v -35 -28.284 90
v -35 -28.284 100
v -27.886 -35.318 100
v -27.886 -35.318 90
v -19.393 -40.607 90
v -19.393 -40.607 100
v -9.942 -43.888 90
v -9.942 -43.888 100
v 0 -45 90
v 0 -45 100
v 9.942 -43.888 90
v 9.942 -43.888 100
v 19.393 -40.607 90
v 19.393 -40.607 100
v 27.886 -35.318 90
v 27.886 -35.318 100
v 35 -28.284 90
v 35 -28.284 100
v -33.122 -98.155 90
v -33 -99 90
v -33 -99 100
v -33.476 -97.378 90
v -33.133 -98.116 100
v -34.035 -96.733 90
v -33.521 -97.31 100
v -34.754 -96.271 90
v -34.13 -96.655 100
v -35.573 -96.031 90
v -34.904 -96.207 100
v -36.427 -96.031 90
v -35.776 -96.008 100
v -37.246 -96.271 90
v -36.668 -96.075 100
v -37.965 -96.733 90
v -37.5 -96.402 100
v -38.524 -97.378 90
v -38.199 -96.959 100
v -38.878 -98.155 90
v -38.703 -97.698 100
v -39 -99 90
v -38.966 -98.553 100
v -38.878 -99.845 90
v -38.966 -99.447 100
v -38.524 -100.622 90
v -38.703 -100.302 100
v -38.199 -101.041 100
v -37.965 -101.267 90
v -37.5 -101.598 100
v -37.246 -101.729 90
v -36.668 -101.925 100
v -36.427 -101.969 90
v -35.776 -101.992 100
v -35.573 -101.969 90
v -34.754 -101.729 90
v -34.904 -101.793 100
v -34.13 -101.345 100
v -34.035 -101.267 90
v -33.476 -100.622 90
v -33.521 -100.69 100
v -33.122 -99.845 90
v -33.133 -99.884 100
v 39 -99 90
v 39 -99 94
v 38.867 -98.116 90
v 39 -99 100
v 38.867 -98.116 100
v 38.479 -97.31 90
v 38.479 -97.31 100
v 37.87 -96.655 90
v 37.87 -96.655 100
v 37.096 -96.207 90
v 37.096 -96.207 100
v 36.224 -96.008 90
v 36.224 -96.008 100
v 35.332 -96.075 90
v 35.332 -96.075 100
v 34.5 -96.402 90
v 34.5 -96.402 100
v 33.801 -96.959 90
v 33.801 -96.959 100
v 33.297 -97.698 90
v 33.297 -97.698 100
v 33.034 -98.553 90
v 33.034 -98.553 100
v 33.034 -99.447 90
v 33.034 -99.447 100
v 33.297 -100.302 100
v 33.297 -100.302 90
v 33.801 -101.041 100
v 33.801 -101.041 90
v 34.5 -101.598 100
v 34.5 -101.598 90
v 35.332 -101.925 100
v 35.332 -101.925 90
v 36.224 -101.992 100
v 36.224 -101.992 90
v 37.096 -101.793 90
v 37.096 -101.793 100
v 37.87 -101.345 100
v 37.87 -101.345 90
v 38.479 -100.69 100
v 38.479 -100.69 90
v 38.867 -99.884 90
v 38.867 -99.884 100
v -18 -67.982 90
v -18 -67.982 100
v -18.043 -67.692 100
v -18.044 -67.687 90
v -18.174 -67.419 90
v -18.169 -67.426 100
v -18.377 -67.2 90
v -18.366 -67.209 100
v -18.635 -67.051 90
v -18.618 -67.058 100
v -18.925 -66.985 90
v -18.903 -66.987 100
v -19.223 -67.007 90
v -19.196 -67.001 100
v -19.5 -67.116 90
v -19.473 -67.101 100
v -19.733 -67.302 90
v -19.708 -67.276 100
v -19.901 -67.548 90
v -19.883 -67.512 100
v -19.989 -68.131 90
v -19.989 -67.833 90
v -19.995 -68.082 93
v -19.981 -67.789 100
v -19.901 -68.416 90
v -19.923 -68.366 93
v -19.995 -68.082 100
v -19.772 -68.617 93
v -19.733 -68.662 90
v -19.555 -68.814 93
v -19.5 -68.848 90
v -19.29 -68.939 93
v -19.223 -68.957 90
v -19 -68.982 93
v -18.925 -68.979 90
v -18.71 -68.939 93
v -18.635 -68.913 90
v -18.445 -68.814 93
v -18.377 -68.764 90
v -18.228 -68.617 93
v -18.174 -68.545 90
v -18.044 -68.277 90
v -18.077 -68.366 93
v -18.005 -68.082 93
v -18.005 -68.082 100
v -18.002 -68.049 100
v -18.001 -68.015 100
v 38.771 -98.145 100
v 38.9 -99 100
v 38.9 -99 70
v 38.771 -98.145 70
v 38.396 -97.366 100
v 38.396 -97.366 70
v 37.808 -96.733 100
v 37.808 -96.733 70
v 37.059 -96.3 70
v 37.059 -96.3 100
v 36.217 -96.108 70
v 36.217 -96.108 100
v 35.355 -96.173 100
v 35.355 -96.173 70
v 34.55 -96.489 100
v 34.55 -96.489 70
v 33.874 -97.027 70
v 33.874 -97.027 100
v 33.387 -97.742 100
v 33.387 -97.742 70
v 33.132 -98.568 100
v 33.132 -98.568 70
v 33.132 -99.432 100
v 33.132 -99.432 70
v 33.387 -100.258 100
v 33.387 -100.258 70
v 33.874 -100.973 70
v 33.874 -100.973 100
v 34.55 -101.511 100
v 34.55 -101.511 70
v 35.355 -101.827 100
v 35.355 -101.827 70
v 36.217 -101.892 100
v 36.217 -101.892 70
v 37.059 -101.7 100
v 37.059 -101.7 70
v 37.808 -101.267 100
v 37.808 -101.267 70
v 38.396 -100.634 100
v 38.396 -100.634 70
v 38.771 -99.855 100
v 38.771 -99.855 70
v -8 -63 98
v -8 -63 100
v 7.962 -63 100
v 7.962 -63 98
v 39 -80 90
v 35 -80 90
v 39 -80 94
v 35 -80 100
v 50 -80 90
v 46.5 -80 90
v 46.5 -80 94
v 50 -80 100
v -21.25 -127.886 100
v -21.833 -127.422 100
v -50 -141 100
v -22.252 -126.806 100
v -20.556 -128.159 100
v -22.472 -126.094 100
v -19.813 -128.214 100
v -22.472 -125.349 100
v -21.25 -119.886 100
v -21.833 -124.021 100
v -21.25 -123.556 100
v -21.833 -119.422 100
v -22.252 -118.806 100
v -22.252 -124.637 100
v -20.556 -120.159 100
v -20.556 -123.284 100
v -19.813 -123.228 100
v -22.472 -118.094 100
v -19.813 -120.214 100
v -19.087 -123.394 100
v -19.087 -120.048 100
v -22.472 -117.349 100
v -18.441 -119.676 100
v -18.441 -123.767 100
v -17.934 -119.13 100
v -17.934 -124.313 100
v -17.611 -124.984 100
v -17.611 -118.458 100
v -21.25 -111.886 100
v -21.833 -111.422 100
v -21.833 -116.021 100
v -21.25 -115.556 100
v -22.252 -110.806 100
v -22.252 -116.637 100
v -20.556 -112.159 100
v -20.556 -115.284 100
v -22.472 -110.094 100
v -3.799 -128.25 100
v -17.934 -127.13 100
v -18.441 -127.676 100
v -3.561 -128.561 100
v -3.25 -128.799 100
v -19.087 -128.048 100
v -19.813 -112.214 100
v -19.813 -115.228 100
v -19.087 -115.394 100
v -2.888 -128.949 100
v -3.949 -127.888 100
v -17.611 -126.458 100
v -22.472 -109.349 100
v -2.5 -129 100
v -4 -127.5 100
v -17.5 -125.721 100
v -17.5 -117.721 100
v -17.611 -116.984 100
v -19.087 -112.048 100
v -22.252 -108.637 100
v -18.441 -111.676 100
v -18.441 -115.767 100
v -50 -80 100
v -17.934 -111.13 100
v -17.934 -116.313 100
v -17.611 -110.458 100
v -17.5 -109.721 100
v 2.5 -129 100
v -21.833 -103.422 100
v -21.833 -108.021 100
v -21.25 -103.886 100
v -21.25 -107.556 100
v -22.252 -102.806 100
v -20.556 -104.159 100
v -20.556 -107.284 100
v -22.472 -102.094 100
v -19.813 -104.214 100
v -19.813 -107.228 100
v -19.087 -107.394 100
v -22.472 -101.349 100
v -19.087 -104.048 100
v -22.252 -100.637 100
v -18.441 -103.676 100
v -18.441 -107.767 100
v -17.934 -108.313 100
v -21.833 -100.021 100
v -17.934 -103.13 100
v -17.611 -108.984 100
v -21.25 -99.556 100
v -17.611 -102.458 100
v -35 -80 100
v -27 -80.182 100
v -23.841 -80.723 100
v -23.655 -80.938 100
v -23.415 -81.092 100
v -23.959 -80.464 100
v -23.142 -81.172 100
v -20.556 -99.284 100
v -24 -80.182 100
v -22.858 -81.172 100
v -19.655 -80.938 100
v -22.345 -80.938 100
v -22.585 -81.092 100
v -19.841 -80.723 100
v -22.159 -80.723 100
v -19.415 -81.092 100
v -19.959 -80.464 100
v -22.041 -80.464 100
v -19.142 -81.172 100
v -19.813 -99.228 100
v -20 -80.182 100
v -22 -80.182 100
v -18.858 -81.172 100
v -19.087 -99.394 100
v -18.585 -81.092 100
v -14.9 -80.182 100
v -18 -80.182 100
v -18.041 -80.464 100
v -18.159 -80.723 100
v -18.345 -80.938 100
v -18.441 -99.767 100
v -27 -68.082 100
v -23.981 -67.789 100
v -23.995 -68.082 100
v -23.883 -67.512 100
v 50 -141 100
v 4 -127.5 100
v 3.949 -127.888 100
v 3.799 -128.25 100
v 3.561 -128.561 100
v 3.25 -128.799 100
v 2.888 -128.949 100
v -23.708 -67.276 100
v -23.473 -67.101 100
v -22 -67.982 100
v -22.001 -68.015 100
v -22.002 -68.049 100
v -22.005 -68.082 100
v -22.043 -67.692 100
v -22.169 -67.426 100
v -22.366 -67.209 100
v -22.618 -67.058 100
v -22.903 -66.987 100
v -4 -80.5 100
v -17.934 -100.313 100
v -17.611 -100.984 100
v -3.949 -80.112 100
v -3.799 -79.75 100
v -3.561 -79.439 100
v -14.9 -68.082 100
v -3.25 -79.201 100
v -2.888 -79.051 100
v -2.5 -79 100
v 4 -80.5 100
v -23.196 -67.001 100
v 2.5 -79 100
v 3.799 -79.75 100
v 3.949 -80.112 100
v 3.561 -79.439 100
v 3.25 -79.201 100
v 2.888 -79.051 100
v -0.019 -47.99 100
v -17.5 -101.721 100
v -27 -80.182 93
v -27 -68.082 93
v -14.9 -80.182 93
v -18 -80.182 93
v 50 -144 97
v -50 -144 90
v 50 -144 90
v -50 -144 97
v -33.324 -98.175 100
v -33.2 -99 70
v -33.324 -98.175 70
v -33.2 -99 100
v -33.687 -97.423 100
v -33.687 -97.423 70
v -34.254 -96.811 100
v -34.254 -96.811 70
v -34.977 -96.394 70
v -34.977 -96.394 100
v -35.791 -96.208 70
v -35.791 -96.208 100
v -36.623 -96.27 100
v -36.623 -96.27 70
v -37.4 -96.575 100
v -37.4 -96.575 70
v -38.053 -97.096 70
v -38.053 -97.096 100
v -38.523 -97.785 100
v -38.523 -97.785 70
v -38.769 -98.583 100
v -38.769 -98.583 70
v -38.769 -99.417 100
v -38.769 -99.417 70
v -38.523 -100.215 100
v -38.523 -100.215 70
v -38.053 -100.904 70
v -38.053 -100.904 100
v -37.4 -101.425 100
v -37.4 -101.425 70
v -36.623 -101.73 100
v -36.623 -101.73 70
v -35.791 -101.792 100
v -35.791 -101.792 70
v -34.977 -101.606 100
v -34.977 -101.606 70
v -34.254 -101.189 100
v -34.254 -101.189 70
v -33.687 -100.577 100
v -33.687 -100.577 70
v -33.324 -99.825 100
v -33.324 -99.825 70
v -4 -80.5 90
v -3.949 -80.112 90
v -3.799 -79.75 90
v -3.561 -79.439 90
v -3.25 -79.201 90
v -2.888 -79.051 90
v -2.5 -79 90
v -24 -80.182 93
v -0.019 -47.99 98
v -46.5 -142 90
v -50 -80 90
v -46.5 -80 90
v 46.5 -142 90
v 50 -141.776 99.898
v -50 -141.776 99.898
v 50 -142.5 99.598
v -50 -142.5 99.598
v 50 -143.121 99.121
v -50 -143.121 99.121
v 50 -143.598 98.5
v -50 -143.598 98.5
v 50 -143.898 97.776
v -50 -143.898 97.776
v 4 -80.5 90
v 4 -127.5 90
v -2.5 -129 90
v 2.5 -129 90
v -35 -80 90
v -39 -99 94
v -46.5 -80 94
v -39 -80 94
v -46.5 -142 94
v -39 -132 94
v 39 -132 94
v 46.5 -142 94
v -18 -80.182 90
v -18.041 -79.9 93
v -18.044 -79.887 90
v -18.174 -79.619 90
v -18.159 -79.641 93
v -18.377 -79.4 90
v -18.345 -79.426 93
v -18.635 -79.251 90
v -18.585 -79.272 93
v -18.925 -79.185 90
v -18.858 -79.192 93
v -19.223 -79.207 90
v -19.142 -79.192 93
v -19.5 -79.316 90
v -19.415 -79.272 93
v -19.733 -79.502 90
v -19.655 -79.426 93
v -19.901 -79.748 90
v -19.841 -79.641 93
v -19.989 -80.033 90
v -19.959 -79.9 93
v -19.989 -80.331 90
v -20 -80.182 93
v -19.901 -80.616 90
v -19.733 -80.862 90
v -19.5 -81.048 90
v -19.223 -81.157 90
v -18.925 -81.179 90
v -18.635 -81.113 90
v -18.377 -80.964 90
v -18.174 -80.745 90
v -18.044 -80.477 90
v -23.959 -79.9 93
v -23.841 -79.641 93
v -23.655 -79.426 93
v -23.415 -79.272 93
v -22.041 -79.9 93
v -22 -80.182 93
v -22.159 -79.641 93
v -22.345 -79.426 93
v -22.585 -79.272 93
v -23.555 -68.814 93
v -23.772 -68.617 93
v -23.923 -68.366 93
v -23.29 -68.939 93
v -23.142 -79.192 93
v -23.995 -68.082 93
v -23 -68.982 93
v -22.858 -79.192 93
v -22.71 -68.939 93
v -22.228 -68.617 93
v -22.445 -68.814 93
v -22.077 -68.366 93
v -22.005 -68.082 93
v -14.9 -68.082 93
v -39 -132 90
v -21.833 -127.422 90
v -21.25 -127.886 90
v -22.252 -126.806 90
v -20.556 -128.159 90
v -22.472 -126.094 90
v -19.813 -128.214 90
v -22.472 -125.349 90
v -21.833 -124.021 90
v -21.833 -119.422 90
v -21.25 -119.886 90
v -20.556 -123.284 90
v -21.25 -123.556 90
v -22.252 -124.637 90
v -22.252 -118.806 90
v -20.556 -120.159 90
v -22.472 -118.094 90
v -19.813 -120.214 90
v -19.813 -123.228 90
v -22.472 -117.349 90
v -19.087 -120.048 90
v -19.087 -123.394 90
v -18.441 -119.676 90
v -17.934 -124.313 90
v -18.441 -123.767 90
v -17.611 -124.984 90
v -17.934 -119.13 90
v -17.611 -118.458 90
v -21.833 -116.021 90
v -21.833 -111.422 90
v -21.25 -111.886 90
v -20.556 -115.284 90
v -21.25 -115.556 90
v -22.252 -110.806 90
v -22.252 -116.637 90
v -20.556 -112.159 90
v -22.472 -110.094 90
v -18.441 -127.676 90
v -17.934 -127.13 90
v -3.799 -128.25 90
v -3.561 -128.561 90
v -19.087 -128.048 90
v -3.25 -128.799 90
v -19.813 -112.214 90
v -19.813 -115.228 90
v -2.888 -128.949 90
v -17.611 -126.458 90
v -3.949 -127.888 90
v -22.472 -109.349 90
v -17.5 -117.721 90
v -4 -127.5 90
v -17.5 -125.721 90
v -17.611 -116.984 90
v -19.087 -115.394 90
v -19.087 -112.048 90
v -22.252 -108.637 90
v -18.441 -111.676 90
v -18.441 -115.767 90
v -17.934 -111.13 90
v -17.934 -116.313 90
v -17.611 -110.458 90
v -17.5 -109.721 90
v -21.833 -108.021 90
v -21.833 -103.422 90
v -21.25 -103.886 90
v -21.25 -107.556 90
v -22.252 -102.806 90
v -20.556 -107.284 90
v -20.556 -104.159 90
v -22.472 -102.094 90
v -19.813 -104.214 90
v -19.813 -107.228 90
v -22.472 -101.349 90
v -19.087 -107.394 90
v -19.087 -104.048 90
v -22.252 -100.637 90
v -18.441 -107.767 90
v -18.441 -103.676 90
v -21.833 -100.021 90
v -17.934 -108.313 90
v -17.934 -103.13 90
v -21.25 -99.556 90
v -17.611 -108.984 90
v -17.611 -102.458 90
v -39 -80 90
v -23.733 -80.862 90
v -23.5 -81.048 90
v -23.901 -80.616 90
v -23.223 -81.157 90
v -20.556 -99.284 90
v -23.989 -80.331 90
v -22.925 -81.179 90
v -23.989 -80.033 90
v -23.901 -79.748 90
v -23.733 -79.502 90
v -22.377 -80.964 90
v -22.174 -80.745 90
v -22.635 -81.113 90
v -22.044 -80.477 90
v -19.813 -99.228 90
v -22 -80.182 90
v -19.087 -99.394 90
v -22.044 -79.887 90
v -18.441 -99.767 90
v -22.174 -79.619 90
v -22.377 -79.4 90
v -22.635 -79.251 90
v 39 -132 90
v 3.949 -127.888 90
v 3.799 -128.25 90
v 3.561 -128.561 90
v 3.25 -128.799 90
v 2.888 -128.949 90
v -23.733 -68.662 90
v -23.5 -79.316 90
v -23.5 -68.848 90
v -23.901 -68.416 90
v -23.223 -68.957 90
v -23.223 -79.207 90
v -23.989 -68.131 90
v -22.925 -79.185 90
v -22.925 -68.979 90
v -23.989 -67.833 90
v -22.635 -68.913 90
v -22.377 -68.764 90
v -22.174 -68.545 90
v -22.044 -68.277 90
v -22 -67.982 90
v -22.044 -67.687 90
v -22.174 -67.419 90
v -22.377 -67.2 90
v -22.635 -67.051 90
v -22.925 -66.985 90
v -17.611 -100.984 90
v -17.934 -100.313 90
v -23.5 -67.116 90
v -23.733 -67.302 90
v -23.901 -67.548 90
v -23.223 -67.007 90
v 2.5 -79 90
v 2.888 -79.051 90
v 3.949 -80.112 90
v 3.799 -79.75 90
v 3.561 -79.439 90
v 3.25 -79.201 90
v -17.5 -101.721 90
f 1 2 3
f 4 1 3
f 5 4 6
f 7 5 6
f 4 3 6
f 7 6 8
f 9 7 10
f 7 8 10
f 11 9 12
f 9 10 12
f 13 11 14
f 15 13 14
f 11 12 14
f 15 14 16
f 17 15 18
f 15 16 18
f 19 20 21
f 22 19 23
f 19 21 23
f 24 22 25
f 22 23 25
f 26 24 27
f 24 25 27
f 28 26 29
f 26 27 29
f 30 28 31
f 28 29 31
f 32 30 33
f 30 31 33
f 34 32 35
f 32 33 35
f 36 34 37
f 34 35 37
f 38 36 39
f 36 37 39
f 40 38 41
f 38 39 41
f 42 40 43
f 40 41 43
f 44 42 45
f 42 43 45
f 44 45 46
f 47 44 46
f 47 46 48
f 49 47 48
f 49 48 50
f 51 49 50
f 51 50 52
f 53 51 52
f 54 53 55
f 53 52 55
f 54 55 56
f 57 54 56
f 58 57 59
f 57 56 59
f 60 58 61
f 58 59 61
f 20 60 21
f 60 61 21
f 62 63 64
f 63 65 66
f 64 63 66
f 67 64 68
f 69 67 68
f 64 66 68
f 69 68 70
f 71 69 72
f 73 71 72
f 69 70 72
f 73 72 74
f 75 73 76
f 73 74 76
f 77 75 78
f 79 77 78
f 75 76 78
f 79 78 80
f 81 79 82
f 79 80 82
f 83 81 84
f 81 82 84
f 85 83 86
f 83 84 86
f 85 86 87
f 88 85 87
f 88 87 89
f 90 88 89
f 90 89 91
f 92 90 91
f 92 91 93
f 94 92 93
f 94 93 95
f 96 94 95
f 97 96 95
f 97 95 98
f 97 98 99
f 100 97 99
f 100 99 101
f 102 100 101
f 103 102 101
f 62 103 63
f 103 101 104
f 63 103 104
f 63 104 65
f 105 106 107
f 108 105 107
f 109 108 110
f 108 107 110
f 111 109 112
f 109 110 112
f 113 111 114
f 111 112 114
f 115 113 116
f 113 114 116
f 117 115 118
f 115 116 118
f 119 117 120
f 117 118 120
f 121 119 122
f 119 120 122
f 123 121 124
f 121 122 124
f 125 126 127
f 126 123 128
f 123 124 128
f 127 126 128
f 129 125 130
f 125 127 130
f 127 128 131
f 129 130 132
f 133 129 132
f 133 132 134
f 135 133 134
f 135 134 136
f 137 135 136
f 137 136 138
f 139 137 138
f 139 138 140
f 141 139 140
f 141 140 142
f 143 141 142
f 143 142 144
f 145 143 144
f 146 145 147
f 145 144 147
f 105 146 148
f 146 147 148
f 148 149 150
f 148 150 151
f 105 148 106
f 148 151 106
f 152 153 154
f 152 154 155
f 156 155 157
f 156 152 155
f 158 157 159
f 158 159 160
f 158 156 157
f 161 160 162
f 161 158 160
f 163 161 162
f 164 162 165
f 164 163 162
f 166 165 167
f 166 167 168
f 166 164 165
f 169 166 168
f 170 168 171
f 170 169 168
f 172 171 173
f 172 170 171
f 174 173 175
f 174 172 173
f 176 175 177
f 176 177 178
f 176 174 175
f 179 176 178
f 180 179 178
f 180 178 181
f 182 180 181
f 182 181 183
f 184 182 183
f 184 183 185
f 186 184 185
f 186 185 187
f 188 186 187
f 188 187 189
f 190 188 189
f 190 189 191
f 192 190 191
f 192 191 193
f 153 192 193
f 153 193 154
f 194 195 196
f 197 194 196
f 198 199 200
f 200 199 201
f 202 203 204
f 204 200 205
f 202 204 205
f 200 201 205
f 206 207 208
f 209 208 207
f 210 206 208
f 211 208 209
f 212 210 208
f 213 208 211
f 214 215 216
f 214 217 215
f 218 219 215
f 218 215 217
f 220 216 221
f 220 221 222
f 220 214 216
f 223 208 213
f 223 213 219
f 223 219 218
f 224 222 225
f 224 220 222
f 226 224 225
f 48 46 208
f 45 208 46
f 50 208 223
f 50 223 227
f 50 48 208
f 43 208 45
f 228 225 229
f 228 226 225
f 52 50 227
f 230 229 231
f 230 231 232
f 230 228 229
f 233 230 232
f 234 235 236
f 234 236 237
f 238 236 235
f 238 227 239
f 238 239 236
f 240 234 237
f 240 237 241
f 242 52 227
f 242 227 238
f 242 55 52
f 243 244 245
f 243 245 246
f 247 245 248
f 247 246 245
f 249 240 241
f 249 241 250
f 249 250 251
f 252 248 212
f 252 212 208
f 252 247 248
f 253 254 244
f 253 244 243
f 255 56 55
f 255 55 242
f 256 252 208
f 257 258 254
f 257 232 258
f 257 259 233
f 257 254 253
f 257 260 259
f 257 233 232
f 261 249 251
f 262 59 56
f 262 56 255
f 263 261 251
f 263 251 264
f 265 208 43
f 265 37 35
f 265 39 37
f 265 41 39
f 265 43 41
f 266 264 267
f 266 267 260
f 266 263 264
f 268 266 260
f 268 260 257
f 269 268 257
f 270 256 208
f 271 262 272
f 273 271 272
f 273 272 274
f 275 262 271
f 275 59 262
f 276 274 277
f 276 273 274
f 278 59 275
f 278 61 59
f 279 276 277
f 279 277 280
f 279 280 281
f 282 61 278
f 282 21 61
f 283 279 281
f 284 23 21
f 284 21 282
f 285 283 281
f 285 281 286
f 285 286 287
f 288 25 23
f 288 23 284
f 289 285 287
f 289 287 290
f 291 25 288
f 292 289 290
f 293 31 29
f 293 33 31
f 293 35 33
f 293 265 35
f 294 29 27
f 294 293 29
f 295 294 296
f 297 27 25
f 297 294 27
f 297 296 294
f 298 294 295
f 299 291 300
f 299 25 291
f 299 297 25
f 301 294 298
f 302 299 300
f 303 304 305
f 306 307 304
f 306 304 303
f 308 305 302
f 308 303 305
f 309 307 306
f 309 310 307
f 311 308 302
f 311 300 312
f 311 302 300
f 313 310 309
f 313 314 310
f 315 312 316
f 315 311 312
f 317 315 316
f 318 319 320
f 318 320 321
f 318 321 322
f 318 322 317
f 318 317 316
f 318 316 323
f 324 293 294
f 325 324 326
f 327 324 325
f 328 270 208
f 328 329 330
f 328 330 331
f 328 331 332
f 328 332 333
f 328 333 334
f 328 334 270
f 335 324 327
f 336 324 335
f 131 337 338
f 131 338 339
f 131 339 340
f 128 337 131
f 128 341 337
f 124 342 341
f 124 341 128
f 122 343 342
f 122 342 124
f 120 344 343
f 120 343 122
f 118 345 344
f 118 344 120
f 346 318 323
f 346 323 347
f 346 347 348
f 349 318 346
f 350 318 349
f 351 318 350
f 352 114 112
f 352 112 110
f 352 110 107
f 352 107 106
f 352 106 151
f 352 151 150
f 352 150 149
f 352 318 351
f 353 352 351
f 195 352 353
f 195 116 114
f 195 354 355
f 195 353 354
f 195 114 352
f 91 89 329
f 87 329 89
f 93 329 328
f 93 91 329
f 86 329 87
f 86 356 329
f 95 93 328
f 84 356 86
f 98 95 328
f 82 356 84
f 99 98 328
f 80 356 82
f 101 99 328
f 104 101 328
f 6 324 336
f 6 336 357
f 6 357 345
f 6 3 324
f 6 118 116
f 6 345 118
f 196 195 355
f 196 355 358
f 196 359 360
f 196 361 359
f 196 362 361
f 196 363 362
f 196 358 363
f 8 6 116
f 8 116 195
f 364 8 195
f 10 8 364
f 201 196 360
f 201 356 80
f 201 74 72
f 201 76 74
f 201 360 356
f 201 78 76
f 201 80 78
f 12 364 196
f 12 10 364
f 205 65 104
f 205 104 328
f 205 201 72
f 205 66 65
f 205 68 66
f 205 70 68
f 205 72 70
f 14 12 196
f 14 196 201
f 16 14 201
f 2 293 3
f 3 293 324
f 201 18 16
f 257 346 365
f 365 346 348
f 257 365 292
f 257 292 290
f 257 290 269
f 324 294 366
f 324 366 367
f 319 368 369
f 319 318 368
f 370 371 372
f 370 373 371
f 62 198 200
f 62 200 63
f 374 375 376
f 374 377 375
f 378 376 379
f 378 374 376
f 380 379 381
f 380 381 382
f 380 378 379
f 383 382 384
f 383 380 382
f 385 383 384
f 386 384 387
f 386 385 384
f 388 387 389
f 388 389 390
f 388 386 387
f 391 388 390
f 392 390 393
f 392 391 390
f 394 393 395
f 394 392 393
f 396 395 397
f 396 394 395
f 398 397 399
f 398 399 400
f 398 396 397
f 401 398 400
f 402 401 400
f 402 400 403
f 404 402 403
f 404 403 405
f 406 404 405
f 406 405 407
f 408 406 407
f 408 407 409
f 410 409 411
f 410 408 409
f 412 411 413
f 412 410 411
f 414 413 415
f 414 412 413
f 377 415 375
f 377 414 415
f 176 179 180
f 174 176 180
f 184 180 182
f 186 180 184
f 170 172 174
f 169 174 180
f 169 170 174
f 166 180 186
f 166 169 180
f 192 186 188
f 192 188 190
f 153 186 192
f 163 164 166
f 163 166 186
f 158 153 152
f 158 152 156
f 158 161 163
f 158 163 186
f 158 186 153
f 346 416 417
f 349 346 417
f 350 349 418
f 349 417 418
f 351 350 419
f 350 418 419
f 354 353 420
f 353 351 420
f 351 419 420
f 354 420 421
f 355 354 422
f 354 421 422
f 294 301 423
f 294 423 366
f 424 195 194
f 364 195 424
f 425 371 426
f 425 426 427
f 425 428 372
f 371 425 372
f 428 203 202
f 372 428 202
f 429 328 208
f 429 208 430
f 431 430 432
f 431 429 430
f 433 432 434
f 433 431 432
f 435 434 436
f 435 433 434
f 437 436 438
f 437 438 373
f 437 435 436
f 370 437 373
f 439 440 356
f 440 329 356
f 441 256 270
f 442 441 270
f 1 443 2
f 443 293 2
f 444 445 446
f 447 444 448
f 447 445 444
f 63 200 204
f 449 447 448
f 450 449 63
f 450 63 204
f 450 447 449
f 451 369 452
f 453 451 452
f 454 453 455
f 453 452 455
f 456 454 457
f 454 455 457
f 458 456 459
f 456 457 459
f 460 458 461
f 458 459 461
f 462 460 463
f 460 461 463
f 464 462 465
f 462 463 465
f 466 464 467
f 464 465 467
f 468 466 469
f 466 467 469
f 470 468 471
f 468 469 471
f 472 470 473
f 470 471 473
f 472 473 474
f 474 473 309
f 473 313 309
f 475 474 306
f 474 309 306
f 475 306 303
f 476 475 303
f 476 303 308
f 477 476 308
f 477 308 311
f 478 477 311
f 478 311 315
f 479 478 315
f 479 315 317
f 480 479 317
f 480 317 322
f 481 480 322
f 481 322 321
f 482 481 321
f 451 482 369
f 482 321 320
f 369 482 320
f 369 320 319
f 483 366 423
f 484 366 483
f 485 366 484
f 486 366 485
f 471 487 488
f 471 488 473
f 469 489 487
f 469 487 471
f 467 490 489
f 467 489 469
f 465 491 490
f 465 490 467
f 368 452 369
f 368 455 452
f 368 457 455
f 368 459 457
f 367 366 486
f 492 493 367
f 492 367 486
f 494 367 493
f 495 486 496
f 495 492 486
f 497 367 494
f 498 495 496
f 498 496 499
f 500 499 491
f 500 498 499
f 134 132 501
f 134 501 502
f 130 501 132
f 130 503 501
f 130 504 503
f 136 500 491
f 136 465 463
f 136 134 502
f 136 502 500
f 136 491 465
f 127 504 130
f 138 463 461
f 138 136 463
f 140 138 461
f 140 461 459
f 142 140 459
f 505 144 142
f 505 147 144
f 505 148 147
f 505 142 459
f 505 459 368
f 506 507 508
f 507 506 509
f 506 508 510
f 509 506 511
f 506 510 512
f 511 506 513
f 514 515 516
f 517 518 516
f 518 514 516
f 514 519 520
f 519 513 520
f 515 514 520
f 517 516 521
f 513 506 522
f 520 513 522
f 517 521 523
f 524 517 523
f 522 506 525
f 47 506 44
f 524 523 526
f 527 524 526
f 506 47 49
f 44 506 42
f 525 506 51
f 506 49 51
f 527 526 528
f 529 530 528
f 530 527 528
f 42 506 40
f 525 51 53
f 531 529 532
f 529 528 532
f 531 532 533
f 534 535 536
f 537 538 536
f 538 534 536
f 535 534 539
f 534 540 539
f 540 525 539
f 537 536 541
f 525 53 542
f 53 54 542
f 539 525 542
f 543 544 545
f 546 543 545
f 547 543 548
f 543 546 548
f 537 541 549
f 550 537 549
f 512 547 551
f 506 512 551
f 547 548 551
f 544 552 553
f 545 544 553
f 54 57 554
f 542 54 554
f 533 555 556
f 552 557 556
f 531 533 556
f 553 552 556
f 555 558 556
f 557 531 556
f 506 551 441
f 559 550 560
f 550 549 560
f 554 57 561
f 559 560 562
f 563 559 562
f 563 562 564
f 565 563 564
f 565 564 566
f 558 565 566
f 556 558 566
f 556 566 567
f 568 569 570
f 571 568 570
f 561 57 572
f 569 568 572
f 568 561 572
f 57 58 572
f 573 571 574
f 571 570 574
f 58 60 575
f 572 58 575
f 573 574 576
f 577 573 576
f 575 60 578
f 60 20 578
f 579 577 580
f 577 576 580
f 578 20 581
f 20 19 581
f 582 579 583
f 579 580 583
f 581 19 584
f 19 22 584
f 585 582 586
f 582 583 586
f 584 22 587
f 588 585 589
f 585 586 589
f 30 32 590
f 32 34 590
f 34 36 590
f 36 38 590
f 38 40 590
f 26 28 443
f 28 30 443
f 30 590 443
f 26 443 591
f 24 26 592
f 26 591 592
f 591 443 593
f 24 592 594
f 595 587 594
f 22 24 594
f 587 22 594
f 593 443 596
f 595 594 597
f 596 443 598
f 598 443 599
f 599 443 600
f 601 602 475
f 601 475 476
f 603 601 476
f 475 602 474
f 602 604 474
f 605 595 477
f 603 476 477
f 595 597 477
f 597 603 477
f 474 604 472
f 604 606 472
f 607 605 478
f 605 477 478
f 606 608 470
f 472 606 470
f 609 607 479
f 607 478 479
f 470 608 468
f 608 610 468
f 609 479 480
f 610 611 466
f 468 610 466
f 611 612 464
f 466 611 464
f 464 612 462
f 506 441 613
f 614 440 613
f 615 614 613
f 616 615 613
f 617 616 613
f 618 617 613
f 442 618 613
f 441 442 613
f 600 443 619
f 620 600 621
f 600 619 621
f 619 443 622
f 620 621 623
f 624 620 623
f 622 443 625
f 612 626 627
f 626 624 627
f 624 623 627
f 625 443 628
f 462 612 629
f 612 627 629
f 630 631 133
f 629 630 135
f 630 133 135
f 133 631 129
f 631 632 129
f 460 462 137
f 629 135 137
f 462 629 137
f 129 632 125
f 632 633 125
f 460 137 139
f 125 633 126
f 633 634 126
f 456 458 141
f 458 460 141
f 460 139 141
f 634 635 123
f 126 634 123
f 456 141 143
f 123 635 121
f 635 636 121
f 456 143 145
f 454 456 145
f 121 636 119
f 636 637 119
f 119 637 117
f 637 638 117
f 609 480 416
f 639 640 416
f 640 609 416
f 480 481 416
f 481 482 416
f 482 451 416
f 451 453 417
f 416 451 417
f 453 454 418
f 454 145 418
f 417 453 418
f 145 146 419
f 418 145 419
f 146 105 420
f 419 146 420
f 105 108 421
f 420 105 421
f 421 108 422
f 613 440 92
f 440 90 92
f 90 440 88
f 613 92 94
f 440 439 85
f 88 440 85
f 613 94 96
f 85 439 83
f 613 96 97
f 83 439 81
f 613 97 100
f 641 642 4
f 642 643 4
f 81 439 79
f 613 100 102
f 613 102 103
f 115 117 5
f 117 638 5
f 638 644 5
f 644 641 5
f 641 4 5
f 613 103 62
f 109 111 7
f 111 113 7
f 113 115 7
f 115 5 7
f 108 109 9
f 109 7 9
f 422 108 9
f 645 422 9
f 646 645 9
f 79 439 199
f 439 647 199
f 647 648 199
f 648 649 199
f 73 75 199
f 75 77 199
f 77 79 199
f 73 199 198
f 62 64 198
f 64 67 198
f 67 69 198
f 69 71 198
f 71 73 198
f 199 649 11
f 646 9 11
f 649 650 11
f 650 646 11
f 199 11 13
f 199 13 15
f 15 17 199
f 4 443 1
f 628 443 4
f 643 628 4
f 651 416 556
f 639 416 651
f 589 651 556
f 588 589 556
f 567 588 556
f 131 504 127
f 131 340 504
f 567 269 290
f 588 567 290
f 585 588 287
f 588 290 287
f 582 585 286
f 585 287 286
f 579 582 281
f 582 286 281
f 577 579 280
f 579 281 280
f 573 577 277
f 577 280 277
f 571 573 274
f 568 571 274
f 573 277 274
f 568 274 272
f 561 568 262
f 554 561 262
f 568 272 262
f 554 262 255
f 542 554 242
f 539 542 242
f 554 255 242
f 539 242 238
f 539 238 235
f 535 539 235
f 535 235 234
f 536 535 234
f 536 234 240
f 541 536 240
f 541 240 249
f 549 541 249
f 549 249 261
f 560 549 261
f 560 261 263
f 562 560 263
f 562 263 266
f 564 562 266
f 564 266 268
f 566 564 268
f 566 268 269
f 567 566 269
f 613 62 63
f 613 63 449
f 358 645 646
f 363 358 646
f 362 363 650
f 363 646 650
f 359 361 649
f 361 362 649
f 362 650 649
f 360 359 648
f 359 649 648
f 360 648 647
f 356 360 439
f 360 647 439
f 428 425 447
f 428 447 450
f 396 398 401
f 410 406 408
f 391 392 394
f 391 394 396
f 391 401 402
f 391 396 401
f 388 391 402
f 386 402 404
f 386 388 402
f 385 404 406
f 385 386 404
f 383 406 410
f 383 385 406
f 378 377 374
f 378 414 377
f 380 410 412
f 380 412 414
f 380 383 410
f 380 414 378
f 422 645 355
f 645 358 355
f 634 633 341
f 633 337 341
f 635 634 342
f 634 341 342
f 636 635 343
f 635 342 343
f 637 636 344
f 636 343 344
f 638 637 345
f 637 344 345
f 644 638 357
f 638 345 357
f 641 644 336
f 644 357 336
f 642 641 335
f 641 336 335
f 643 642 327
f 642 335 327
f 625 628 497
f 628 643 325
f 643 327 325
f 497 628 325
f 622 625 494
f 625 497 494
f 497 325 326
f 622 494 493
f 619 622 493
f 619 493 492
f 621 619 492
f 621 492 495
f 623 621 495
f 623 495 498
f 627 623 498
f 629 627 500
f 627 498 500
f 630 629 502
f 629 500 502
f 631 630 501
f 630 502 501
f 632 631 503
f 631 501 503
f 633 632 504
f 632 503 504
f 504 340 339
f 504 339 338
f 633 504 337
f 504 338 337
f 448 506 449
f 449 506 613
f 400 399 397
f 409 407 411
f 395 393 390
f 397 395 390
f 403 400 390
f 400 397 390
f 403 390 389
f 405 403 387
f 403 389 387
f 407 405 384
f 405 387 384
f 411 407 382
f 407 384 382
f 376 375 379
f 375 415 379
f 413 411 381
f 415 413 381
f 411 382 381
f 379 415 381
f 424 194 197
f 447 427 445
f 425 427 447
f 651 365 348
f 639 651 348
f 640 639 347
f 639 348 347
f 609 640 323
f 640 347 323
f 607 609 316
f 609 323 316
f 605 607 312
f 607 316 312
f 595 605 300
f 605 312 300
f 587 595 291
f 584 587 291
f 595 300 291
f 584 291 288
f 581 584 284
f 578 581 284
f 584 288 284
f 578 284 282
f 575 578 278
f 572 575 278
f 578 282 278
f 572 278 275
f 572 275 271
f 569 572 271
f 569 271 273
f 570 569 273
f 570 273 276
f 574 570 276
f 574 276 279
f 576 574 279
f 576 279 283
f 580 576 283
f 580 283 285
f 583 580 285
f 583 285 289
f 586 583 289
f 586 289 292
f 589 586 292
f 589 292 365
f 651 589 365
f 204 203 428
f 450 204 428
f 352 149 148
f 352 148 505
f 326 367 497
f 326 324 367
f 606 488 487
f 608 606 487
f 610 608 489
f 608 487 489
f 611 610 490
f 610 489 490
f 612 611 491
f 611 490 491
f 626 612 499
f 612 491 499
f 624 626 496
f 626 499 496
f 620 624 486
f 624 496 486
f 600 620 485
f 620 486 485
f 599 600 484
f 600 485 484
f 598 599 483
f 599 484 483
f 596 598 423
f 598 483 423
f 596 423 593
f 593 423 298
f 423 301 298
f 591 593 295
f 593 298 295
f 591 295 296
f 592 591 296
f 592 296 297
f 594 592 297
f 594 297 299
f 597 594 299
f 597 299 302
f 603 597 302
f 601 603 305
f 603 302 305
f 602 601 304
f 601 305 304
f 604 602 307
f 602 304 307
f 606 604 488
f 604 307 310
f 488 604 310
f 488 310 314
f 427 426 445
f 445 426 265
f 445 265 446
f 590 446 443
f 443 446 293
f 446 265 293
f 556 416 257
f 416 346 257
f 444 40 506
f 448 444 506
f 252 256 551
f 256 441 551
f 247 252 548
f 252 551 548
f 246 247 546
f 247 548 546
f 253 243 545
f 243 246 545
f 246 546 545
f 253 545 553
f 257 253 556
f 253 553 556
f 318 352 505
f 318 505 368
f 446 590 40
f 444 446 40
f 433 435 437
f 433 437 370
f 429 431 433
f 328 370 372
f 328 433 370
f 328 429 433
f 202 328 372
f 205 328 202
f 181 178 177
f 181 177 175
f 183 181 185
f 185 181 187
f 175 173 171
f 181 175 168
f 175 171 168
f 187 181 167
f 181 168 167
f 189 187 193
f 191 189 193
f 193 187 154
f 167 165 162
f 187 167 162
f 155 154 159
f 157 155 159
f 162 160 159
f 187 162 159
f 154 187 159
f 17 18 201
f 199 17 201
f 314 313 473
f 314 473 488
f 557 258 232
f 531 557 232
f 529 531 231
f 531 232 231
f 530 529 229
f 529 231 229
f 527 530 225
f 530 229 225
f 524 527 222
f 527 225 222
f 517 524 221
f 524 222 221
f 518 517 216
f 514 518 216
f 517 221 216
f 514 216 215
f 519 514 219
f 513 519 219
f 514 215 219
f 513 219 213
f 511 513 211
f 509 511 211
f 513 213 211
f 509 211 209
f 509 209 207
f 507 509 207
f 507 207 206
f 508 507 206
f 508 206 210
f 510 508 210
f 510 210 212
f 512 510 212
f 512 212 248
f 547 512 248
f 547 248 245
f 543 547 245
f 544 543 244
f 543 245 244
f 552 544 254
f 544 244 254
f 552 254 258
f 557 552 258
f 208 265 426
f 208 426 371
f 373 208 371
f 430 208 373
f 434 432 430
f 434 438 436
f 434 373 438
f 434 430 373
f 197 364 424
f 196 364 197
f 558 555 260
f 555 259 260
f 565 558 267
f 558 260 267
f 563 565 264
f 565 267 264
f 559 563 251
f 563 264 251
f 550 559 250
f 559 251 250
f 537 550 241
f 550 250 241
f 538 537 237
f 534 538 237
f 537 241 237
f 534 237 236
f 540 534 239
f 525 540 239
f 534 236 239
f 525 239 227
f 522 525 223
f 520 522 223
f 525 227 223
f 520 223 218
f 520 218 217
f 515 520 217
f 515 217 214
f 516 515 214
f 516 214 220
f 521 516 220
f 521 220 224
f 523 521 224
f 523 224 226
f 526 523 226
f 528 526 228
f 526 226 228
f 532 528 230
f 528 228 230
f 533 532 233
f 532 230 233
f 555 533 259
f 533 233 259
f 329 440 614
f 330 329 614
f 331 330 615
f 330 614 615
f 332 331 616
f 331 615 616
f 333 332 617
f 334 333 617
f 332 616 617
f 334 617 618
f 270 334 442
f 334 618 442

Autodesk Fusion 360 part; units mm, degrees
ref_plane "WorkPlane1" through (0, 0, 100) normal (0, 0, 1) x (1, 0, 0)
sketch "Sketch3" plane through (0, 0, 100) normal (0, 0, 1) x (1, 0, 0)
  line L0 (50, -80) -> (50, 0)
  arc A0 (50, 0) -> (-50, 0) centre (0, 0) ccw
  arc A1 (35, 0) -> (-35, 0) centre (0, 0) ccw
  line L1 (35, 0) -> (35, -80)
  line L2 (35, -80) -> (50, -80)
  line L3 (-50, 0) -> (-50, -80)
  line L4 (-50, -80) -> (-35, -80)
  line L5 (-35, -80) -> (-35, 0)
  circle A2 centre (-36, -99) radius 3
  circle A3 centre (36, -99) radius 3
  line L6 (40, -135) -> (-40, -135)
  line L7 (-40, -135) -> (-40, 0)
  line L8 (40, 0) -> (40, -135)
  line L9 (-44, -139) -> (-44, 0)
  line L10 (44, 0) -> (44, -139)
  line L11 (44, -139) -> (-44, -139)
  arc A4 (-35, -28.2843) -> (35, -28.2843) centre (0, 0) ccw
  line L12 (-35, -28.2843) -> (-35, -80)
  line L13 (-50, -80) -> (-50, -144)
  line L14 (-50, -144) -> (50, -144)
  line L15 (50, -144) -> (50, -80)
  line L16 (50, -80) -> (35, -80)
  line L17 (35, -28.2843) -> (35, -80)
  line L18 (-50, -80) -> (-35, -80)
  circle A5 centre (-36, -99) radius 2.8
  circle A6 centre (36, -99) radius 2.9
  dimension "d2" = 90
  dimension "d3" = 5.6
  dimension "d4" = 5.8
  dimension "d15" = 64
extrude "Extrude1" add sketch "Sketch3" against normal blind 10 contours L2 L4 L9 L10 L11 L13 L14 L15 L16 L18 | L2 L4 L6 L7 L8 L9 L10 L11 L16 L18 | L1 L2 L4 L5 L6 L7 L8 A4 L12 L16 L17 L18 makes body 1
extrude "Extrude2" add sketch "Sketch3" against normal blind 30 separate body contours A5 | A6 makes body 2 at (-33.541, -100.3391, 80) makes body 3 at (37.1927, -96.3566, 80)
sketch "Sketch6" plane through (0, 0, 90) normal (0, 0, -1) x (1, 0, 0)
  circle A0 centre (36, 99) radius 3
  circle A1 centre (-36, 99) radius 3
  line L0 (50, 144) -> (-50, 144)
  line L1 (-50, 144) -> (-50, 80)
  line L2 (-50, 80) -> (-35, 80)
  line L3 (-35, 80) -> (-35, 28.2843)
  arc A2 (35, 28.2843) -> (-35, 28.2843) centre (0, 0) ccw
  line L4 (35, 28.2843) -> (35, 80)
  line L5 (35, 80) -> (50, 80)
  line L6 (50, 80) -> (50, 144)
  line L7 (35, 80) -> (42.5, 80)
  line L8 (42.5, 80) -> (46.5, 80)
  line L9 (42.5, 80) -> (39, 80)
  line L10 (46.5, 80) -> (46.5, 133)
  line L11 (39, 80) -> (39, 132)
  line L12 (0, 0) -> (0, 10)
  line L13 (0, 10) -> (0, 183.5284)
  line L14 (0, 10) -> (0, 183.5284)
  line L15 (-39, 80) -> (-39, 132)
  line L16 (-46.5, 80) -> (-46.5, 133)
  line L17 (-42.5, 80) -> (-39, 80)
  line L18 (-42.5, 80) -> (-46.5, 80)
  line L19 (-39, 132) -> (39, 132)
  line L20 (46.5, 133) -> (46.5, 142)
  line L21 (-46.5, 133) -> (-46.5, 142)
  line L22 (-46.5, 142) -> (46.5, 142)
  line L23 (44, 139) -> (-44, 139)
  dimension "d9" = 4
  dimension "d10" = 3.5
  dimension "d11" = 53
  dimension "d12" = 52
  dimension "d19" = 3
extrude "Extrude4" cut sketch "Sketch6" against normal blind 4 contours L5 L7 L8 L9 L10 L11 L13 L14 L19 L20 L22 | L2 L13 L14 L15 L16 L17 L18 L19 L21 L22 bodies 1
sketch "Sketch7" plane through (0, 0, 100) normal (0, 0, 1) x (1, 0, 0)
  line L0 (-20, -101.7213) -> (-20, -125.7213)
  circle A0 centre (-20, -101.7213) radius 2.5
  circle A1 centre (-20, -125.7213) radius 2.5
  circle A2 centre (-20, -117.7213) radius 2.5
  circle A3 centre (-20, -109.7213) radius 2.5
  dimension "d20" = 5
  dimension "d21" = 24
  dimension "d22" = 5
  dimension "d23" = 5
  dimension "d24" = 5
  dimension "d28" = 8
  dimension "d30" = 8
  dimension "d31" = 8
extrude "Extrude5" cut sketch "Sketch7" against normal blind 45 bodies 1
sketch "Sketch8" plane through (0, 0, 100) normal (0, 0, 1) x (1, 0, 0)
  line L0 (-27, -68.082) -> (-14.9, -68.082)
  line L1 (-14.9, -68.082) -> (-14.9, -80.182)
  line L2 (-14.9, -80.182) -> (-27, -80.182)
  line L3 (-27, -80.182) -> (-27, -68.082)
  line L4 (-27, -80.182) -> (-23, -80.182)
  circle A0 centre (-23, -80.182) radius 1
  line L5 (-23, -80.182) -> (-19, -80.182)
  circle A1 centre (-19, -80.182) radius 1
  line L6 (-27, -68.082) -> (-27, -74.082)
  line L7 (-27, -74.082) -> (-7.7924, -74.082)
  line L8 (-27, -74.082) -> (-7.7924, -74.082)
  circle A2 centre (-23, -67.982) radius 1
  circle A3 centre (-19, -67.982) radius 1
  point P0 (-35, -80)
  dimension "d34" = 12.1
  dimension "d35" = 12.1
  dimension "d36" = 4
  dimension "d37" = 2
  dimension "d38" = 4
  dimension "d39" = 2
  dimension "d40" = 6
  dimension "d41" = 8
extrude "Extrude6" cut sketch "Sketch8" against normal blind 17 contours L0 A2 | L0 A2 | L0 A3 | L0 A3 | L2 L4 A0 L5 | L2 L4 A0 L5 | L2 L5 A1 | L2 L5 A1 bodies 1
extrude "Extrude7" cut sketch "Sketch8" against normal blind 7 contours L0 L1 L3 L6 L7 L8 A2 A3 | L1 L2 L3 L4 A0 L5 A1 L7 L8 bodies 1
sketch "Sketch9" plane through (0, 0, 100) normal (0, 0, 1) x (1, 0, 0)
  line L0 (4, -79) -> (-4, -79)
  line L1 (-4, -79) -> (-4, -129)
  line L2 (-4, -129) -> (4, -129)
  line L3 (4, -129) -> (4, -79)
  line L4 (4, -79) -> (-4, -129) construction
  line L5 (-4, -79) -> (4, -129) construction
  line L6 (-50, -144) -> (50, -144)
  point P0 (0, -104)
  dimension "d46" = 8
  dimension "d47" = 50
  dimension "d48" = 15
extrude "Extrude8" cut sketch "Sketch9" against normal blind 55 bodies 1
fillet "Fillet1" radius 1.5 4 edges at (-4, -79, 95) (4, -79, 95) (-4, -129, 95) (4, -129, 95) on bodies 1
fillet "Fillet2" radius 3 1 edges at (0, -144, 100) on bodies 1
sketch "Sketch12" plane through (0, 0, 100) normal (0, 0, 1) x (1, 0, 0)
  line L0 (0, -63) -> (8, -63)
  line L1 (0, -63) -> (-8, -63)
  line L2 (-8, -63) -> (-0.019, -47.9899)
  line L3 (-8, -63) -> (4.6601, -63) construction
  line L4 (0, -10) -> (0, -183.5284)
  line L5 (-0.019, -47.9899) -> (7.962, -63)
  line L6 (-0.019, -47.9899) -> (16.981, -47.9899) construction
  dimension "d78" = 8
  dimension "d79" = 8
  dimension "d80" = 17
  dimension "d81" = 62
  dimension "d82" = 17
  dimension "d83" = 62
extrude "Extrude10" cut sketch "Sketch12" against normal blind 2 bodies 1
equation "d7 = -23 mm - 7 mm"
